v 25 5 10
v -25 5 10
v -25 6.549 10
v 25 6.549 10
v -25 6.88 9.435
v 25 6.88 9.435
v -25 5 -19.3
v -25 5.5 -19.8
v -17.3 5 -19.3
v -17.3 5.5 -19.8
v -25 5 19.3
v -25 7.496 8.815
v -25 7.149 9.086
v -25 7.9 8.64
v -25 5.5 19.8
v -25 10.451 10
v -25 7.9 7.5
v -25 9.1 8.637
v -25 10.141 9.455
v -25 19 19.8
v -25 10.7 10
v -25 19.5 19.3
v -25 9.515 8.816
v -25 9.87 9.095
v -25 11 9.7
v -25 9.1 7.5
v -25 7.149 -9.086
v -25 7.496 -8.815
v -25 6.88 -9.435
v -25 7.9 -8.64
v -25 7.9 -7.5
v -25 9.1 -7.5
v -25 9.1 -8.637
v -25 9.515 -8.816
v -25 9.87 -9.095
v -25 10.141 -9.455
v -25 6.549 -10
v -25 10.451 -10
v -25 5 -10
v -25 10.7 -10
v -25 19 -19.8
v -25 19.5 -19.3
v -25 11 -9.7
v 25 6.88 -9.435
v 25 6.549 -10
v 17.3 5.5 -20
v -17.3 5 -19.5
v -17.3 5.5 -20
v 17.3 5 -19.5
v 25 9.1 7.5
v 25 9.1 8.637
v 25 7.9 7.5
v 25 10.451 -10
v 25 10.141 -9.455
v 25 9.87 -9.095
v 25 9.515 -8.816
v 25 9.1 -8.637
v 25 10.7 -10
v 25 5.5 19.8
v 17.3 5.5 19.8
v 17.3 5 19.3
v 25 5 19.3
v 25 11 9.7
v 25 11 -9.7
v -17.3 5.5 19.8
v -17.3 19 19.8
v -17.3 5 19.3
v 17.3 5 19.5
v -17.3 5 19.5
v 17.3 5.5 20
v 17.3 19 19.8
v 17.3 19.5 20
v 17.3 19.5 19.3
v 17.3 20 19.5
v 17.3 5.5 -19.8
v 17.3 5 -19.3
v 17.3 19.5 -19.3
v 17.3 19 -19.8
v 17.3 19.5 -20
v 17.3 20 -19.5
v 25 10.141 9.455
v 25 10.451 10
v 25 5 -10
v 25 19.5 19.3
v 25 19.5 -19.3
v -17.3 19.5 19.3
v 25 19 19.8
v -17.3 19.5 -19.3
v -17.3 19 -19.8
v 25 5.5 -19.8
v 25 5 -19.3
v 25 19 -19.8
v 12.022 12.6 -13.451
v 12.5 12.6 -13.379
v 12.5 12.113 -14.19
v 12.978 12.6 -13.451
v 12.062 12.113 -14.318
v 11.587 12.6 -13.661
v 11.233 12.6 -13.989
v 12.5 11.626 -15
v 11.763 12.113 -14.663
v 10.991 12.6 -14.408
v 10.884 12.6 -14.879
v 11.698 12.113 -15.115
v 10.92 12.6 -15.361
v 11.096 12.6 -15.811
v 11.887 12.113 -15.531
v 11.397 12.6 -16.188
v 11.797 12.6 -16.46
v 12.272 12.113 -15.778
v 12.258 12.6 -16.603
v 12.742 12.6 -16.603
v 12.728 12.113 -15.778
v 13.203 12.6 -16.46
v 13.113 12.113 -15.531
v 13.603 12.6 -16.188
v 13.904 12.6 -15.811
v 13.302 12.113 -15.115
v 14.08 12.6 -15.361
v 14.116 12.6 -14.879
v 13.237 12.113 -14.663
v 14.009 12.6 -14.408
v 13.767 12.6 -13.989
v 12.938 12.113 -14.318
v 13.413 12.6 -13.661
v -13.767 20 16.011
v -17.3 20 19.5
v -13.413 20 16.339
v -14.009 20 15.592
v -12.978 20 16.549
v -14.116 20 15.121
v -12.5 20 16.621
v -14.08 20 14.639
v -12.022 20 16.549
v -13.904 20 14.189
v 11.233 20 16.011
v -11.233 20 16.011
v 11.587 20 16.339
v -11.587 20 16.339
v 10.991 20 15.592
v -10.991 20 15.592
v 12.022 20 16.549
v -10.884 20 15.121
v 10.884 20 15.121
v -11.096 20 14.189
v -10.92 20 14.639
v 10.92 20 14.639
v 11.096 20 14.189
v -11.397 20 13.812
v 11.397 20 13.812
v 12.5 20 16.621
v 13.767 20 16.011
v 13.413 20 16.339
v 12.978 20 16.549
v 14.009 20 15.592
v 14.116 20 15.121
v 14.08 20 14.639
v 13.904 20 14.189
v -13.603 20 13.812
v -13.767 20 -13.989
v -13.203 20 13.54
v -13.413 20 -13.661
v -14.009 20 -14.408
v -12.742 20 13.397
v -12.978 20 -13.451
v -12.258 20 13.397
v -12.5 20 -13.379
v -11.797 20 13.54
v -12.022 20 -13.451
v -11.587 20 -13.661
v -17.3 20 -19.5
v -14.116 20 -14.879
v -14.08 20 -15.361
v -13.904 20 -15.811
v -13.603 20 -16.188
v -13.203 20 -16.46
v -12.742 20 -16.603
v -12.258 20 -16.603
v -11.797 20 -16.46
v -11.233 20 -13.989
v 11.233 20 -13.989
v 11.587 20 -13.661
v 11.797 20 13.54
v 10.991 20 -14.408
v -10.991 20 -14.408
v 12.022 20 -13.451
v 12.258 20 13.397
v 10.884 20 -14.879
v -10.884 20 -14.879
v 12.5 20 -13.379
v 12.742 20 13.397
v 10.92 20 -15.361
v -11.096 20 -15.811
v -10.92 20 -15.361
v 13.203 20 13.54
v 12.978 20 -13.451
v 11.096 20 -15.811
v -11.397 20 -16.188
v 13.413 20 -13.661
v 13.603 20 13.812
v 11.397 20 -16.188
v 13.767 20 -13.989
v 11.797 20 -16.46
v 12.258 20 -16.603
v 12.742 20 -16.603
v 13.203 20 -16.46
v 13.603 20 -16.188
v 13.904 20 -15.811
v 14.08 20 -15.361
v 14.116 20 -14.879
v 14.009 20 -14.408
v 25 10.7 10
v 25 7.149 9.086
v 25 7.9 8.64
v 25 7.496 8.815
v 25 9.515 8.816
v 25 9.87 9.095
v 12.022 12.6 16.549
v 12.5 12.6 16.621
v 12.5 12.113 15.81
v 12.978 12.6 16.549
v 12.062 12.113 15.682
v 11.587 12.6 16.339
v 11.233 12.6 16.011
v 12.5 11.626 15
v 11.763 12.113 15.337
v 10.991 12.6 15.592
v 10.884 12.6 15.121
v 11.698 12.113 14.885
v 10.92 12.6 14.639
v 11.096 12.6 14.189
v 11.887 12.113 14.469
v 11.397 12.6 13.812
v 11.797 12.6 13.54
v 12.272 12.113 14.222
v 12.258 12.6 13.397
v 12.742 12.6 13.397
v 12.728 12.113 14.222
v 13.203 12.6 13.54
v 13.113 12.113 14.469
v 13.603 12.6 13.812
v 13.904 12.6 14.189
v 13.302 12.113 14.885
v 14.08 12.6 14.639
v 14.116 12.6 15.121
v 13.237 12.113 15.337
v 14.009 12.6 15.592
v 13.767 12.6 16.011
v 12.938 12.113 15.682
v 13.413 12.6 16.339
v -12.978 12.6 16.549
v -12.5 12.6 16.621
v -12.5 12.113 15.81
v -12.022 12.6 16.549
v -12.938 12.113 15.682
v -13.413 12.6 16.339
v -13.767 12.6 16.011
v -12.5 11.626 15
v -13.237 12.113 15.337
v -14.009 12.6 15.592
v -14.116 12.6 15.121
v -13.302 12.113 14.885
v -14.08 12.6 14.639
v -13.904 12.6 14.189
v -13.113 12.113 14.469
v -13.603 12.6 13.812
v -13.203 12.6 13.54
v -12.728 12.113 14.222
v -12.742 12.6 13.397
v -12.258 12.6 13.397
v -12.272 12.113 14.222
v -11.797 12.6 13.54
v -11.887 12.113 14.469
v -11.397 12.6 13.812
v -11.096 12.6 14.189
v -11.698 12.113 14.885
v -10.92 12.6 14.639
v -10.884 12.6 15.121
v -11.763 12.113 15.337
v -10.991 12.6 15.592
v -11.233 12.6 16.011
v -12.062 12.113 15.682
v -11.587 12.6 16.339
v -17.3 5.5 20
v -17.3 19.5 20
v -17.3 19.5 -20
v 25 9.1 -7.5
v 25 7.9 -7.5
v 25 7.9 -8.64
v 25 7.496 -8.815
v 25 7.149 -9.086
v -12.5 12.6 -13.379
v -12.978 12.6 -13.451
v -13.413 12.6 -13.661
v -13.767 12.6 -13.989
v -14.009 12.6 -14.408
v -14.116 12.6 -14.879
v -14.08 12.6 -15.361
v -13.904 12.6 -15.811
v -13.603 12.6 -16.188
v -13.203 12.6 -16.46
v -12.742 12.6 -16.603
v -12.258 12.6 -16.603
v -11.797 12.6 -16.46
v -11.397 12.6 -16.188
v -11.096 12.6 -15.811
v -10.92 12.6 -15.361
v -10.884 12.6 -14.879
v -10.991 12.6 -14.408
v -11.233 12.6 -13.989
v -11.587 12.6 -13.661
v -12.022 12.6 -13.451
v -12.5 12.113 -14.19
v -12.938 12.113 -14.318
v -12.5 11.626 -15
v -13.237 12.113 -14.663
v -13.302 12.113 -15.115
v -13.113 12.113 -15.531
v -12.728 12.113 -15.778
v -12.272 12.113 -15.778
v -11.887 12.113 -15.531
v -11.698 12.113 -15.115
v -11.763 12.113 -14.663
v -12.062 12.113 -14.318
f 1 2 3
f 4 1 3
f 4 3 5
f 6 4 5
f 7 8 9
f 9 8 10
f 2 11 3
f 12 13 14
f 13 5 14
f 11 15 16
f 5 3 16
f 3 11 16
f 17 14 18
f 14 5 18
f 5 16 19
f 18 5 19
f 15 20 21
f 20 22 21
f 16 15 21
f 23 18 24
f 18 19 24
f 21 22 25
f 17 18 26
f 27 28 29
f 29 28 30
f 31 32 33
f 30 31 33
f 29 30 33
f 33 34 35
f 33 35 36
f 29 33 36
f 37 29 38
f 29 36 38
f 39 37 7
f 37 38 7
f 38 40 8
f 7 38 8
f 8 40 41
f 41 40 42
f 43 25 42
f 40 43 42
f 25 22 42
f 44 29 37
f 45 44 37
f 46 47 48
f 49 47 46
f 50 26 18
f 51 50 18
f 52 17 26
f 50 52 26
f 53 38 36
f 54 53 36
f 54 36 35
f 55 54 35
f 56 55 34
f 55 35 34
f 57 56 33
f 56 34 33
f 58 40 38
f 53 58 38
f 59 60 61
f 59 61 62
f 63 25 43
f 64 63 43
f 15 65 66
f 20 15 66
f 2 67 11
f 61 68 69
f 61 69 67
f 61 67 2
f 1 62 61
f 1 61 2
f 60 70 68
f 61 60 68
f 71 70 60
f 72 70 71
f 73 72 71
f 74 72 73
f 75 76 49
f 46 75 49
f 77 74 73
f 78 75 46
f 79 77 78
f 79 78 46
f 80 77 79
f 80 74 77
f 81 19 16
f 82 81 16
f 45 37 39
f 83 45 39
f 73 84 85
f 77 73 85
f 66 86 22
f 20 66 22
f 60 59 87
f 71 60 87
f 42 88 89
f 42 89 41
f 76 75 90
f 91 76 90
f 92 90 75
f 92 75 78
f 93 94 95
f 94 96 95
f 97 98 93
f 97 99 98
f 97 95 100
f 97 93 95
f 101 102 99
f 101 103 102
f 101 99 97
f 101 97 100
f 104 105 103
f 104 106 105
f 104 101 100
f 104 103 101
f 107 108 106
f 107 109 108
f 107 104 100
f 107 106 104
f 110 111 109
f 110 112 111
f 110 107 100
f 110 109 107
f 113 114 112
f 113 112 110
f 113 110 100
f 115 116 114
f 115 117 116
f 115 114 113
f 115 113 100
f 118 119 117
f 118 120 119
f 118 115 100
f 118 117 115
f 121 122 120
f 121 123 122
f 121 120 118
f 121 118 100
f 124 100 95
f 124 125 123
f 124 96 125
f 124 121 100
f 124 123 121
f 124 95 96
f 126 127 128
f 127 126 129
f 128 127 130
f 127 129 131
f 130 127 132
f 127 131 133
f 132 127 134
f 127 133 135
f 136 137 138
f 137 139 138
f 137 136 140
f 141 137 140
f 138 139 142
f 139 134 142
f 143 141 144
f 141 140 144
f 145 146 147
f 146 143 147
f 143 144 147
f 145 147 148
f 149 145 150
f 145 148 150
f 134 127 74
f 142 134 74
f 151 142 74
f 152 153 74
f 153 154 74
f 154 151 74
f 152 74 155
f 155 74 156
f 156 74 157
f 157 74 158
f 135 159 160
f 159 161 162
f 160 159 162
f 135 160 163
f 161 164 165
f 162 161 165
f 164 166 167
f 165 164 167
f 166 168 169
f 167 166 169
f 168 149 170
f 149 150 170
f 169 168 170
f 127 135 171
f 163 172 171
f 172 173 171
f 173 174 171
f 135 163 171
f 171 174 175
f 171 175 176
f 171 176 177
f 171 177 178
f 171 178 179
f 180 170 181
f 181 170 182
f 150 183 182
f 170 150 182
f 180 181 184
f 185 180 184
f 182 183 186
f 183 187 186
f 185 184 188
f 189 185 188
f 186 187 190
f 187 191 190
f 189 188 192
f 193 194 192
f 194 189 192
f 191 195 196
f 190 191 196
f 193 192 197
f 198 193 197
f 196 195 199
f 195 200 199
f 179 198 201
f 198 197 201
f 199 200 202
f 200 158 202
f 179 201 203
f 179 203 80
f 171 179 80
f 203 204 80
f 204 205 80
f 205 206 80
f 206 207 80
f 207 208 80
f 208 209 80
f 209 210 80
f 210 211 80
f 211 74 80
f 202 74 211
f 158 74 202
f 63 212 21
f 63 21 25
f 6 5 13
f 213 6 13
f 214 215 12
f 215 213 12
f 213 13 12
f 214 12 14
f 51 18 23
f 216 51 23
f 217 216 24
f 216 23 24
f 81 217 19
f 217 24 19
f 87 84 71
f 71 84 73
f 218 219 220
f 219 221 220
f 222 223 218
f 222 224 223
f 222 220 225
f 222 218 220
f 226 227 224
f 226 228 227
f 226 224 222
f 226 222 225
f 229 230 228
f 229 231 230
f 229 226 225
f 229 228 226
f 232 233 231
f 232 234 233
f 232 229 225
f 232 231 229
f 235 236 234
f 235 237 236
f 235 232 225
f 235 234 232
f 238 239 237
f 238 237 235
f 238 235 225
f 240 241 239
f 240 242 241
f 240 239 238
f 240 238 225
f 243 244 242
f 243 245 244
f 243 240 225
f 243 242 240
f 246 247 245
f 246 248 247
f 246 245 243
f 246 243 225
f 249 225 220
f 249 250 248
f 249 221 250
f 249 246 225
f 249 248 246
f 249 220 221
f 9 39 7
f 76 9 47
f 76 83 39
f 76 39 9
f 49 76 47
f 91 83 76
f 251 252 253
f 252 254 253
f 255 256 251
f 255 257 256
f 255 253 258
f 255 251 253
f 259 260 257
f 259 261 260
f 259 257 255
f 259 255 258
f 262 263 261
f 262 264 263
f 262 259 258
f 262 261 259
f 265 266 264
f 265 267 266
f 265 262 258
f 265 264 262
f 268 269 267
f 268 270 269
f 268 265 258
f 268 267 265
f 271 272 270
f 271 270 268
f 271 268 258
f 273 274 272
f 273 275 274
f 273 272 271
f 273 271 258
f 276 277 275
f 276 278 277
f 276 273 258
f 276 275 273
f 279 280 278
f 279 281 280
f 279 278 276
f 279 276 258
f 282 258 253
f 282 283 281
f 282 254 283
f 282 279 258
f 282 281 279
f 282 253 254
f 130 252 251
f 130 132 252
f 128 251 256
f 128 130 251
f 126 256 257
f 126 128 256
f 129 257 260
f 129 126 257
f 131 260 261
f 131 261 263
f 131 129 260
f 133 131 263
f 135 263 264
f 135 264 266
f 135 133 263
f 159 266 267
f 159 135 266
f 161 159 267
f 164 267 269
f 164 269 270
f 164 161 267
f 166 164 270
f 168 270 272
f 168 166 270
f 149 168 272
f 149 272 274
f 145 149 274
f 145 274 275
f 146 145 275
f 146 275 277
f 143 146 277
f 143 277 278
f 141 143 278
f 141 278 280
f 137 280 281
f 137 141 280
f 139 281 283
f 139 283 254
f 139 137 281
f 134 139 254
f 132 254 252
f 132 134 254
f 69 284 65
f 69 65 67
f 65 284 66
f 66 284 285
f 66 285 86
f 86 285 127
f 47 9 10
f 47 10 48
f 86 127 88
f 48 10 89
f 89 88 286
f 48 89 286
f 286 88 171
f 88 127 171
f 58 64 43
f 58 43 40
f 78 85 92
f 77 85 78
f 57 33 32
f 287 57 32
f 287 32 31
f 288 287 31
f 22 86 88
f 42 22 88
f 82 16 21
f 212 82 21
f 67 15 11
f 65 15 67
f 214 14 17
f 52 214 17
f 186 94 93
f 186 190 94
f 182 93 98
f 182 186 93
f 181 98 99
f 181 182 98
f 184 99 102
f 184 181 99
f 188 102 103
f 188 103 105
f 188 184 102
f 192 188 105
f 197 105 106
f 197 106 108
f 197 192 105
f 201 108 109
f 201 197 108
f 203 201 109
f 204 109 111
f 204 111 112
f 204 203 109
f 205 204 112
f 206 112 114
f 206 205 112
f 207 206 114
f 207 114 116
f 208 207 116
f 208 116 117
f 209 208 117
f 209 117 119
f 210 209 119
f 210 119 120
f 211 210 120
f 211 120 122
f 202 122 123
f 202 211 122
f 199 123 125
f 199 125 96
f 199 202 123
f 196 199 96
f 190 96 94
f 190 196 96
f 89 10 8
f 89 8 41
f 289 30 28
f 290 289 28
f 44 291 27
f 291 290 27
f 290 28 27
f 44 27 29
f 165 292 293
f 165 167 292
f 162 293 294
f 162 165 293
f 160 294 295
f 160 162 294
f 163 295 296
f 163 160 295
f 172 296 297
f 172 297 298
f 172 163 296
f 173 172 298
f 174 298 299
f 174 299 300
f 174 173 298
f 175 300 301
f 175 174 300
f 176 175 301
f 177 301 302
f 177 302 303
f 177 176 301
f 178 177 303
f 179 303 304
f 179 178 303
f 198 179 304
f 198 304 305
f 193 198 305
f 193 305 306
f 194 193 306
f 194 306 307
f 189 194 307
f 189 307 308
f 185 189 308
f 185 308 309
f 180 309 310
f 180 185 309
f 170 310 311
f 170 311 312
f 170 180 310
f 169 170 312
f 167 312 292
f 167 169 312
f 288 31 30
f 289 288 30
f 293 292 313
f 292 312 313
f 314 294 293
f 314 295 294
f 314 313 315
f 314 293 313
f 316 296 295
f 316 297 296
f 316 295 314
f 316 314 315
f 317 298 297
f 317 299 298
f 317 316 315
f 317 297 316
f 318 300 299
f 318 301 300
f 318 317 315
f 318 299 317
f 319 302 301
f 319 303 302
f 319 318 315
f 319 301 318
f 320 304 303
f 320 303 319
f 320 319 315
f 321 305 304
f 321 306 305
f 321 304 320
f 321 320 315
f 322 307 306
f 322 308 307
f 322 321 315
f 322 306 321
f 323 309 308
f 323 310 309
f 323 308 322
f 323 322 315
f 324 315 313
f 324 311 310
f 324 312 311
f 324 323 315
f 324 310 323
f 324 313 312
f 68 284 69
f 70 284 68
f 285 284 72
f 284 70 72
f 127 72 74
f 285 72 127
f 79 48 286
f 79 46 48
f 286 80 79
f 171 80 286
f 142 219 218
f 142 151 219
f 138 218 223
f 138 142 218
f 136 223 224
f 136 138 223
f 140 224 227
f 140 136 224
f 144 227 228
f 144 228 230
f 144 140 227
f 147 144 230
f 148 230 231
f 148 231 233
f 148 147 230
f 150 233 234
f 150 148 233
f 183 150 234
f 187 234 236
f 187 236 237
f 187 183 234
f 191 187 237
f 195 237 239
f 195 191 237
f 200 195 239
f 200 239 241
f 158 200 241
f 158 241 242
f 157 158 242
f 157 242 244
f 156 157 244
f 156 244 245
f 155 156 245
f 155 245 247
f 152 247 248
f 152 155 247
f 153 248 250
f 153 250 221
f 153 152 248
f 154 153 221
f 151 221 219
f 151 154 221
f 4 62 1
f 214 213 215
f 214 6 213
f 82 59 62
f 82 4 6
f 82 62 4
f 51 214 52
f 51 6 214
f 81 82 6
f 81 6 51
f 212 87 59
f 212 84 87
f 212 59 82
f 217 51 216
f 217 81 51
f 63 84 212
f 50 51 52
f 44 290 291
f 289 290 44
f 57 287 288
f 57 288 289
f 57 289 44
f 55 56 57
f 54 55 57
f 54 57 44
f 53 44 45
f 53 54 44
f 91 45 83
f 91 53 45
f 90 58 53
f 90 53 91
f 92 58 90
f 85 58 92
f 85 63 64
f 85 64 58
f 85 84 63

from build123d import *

# Parameters (mm, degrees)
SKETCH1_W               = 39.6
SKETCH1_H               = 14.5
BOSS_EXTRUDE1_DEPTH     = 25
SKETCH2_W               = 40
SKETCH2_H               = 15
BOSS_EXTRUDE2_DEPTH     = 17.3
CUT_EXTRUDE2_DEPTH      = 38.749172176
CUT_EXTRUDE2_DEPTH_BACK = 38.749172176
CHAMFER1_SIZE           = 0.5
CHAMFER2_SIZE           = 0.5
CHAMFER3_SIZE           = 0.5
CHAMFER4_SIZE           = 0.5
LPATTERN2_COUNT         = 2
LPATTERN2_PITCH         = 25
LPATTERN2_COUNT_DIR2    = 2
LPATTERN2_PITCH_DIR2    = 30


with BuildPart() as part:
    # Sketch1 → Boss-Extrude1 (new, symmetric)
    with BuildSketch(Plane(origin=(0, 0, 0), x_dir=(0, 0, -1), z_dir=(1, 0, 0))):
        with Locations((0, 12.25)):
            Rectangle(SKETCH1_W, SKETCH1_H)
    extrude(amount=BOSS_EXTRUDE1_DEPTH, both=True)

    # Sketch2 → Boss-Extrude2 (add, symmetric)
    with BuildSketch(Plane(origin=(0, 0, 0), x_dir=(0, 0, -1), z_dir=(1, 0, 0))):
        with Locations((0, 12.5)):
            Rectangle(SKETCH2_W, SKETCH2_H)
    extrude(amount=BOSS_EXTRUDE2_DEPTH, both=True)

    # Sketch4 → Cut-Extrude2 (cut, two sides: drawn at the far end of the back side and taken through both)
    with BuildSketch(Plane(origin=(0, 0, 0), x_dir=(0, 0, -1), z_dir=(1, 0, 0)).offset(-CUT_EXTRUDE2_DEPTH_BACK)):
        with BuildLine():
            Line((-9.7, 11), (9.7, 11))
            Line((9.7, 11), (10, 10.7))
            Line((10, 10.7), (10, 10.451039482))
            Line((10, 10.451039482), (9.455259378, 10.141421591))
            ThreePointArc((9.455259378, 10.141421591), (8.943868436, 9.701092928), (8.637115571, 9.1))
            Line((8.637115571, 9.1), (7.5, 9.1))
            Line((7.5, 9.1), (7.5, 7.9))
            Line((7.5, 7.9), (8.64, 7.9))
            ThreePointArc((8.64, 7.9), (8.939788863, 7.314120259), (9.434780564, 6.880401858))
            Line((9.434780564, 6.880401858), (10, 6.548960518))
            Line((10, 6.548960518), (10, 0))
            Line((10, 0), (-10, 0))
            Line((-10, 0), (-10, 6.548960518))
            Line((-10, 6.548960518), (-9.434780564, 6.880401858))
            ThreePointArc((-9.434780564, 6.880401858), (-8.939788863, 7.314120259), (-8.64, 7.9))
            Line((-8.64, 7.9), (-7.5, 7.9))
            Line((-7.5, 7.9), (-7.5, 9.1))
            Line((-7.5, 9.1), (-8.637115571, 9.1))
            ThreePointArc((-8.637115571, 9.1), (-8.943868436, 9.701092928), (-9.455259378, 10.141421591))
            Line((-9.455259378, 10.141421591), (-10, 10.451039482))
            Line((-10, 10.451039482), (-10, 10.7))
            Line((-10, 10.7), (-9.7, 11))
        make_face()
    extrude(amount=CUT_EXTRUDE2_DEPTH + CUT_EXTRUDE2_DEPTH_BACK, mode=Mode.SUBTRACT)

    # Chamfer1
    chamfer1_edges = [part.edges().sort_by_distance(p)[0] for p in [
        (-21.15, 19.5, 19.8),
        (-21.15, 19.5, -19.8),
        (21.15, 19.5, 19.8),
        (21.15, 19.5, -19.8),
    ]]
    chamfer(chamfer1_edges, length=CHAMFER1_SIZE)

    # Chamfer2
    chamfer2_edges = [part.edges().sort_by_distance(p)[0] for p in [
        (0, 20, 20),
        (0, 20, -20),
    ]]
    chamfer(chamfer2_edges, length=CHAMFER2_SIZE)

    # Chamfer3
    chamfer3_edges = [part.edges().sort_by_distance(p)[0] for p in [
        (-21.15, 5, -19.8),
        (-21.15, 5, 19.8),
        (21.15, 5, -19.8),
        (21.15, 5, 19.8),
    ]]
    chamfer(chamfer3_edges, length=CHAMFER3_SIZE)

    # Chamfer4
    chamfer4_edges = [part.edges().sort_by_distance(p)[0] for p in [
        (0, 5, 20),
        (0, 5, -20),
    ]]
    chamfer(chamfer4_edges, length=CHAMFER4_SIZE)

    # Sketch7 → Tap2 (revolve, cut)
    with BuildSketch(Plane(origin=(-12.5, 20, -15), x_dir=(0, 0, 1), z_dir=(1, 0, 0))):
        Polygon((0, 0), (0, 8.373995063), (1.621, 7.4), (1.621, 0), align=None)
    tap2 = revolve(axis=Axis((-12.5, 20, -15), (0, -1, 0)), mode=Mode.SUBTRACT)

    # LPattern2: Tap2 2 × 2
    with Locations(*[(i * LPATTERN2_PITCH, 0, j * LPATTERN2_PITCH_DIR2) for i in range(LPATTERN2_COUNT) for j in range(LPATTERN2_COUNT_DIR2) if (i, j) != (0, 0)]):
        add(tap2, mode=Mode.SUBTRACT)


solid = part.part
